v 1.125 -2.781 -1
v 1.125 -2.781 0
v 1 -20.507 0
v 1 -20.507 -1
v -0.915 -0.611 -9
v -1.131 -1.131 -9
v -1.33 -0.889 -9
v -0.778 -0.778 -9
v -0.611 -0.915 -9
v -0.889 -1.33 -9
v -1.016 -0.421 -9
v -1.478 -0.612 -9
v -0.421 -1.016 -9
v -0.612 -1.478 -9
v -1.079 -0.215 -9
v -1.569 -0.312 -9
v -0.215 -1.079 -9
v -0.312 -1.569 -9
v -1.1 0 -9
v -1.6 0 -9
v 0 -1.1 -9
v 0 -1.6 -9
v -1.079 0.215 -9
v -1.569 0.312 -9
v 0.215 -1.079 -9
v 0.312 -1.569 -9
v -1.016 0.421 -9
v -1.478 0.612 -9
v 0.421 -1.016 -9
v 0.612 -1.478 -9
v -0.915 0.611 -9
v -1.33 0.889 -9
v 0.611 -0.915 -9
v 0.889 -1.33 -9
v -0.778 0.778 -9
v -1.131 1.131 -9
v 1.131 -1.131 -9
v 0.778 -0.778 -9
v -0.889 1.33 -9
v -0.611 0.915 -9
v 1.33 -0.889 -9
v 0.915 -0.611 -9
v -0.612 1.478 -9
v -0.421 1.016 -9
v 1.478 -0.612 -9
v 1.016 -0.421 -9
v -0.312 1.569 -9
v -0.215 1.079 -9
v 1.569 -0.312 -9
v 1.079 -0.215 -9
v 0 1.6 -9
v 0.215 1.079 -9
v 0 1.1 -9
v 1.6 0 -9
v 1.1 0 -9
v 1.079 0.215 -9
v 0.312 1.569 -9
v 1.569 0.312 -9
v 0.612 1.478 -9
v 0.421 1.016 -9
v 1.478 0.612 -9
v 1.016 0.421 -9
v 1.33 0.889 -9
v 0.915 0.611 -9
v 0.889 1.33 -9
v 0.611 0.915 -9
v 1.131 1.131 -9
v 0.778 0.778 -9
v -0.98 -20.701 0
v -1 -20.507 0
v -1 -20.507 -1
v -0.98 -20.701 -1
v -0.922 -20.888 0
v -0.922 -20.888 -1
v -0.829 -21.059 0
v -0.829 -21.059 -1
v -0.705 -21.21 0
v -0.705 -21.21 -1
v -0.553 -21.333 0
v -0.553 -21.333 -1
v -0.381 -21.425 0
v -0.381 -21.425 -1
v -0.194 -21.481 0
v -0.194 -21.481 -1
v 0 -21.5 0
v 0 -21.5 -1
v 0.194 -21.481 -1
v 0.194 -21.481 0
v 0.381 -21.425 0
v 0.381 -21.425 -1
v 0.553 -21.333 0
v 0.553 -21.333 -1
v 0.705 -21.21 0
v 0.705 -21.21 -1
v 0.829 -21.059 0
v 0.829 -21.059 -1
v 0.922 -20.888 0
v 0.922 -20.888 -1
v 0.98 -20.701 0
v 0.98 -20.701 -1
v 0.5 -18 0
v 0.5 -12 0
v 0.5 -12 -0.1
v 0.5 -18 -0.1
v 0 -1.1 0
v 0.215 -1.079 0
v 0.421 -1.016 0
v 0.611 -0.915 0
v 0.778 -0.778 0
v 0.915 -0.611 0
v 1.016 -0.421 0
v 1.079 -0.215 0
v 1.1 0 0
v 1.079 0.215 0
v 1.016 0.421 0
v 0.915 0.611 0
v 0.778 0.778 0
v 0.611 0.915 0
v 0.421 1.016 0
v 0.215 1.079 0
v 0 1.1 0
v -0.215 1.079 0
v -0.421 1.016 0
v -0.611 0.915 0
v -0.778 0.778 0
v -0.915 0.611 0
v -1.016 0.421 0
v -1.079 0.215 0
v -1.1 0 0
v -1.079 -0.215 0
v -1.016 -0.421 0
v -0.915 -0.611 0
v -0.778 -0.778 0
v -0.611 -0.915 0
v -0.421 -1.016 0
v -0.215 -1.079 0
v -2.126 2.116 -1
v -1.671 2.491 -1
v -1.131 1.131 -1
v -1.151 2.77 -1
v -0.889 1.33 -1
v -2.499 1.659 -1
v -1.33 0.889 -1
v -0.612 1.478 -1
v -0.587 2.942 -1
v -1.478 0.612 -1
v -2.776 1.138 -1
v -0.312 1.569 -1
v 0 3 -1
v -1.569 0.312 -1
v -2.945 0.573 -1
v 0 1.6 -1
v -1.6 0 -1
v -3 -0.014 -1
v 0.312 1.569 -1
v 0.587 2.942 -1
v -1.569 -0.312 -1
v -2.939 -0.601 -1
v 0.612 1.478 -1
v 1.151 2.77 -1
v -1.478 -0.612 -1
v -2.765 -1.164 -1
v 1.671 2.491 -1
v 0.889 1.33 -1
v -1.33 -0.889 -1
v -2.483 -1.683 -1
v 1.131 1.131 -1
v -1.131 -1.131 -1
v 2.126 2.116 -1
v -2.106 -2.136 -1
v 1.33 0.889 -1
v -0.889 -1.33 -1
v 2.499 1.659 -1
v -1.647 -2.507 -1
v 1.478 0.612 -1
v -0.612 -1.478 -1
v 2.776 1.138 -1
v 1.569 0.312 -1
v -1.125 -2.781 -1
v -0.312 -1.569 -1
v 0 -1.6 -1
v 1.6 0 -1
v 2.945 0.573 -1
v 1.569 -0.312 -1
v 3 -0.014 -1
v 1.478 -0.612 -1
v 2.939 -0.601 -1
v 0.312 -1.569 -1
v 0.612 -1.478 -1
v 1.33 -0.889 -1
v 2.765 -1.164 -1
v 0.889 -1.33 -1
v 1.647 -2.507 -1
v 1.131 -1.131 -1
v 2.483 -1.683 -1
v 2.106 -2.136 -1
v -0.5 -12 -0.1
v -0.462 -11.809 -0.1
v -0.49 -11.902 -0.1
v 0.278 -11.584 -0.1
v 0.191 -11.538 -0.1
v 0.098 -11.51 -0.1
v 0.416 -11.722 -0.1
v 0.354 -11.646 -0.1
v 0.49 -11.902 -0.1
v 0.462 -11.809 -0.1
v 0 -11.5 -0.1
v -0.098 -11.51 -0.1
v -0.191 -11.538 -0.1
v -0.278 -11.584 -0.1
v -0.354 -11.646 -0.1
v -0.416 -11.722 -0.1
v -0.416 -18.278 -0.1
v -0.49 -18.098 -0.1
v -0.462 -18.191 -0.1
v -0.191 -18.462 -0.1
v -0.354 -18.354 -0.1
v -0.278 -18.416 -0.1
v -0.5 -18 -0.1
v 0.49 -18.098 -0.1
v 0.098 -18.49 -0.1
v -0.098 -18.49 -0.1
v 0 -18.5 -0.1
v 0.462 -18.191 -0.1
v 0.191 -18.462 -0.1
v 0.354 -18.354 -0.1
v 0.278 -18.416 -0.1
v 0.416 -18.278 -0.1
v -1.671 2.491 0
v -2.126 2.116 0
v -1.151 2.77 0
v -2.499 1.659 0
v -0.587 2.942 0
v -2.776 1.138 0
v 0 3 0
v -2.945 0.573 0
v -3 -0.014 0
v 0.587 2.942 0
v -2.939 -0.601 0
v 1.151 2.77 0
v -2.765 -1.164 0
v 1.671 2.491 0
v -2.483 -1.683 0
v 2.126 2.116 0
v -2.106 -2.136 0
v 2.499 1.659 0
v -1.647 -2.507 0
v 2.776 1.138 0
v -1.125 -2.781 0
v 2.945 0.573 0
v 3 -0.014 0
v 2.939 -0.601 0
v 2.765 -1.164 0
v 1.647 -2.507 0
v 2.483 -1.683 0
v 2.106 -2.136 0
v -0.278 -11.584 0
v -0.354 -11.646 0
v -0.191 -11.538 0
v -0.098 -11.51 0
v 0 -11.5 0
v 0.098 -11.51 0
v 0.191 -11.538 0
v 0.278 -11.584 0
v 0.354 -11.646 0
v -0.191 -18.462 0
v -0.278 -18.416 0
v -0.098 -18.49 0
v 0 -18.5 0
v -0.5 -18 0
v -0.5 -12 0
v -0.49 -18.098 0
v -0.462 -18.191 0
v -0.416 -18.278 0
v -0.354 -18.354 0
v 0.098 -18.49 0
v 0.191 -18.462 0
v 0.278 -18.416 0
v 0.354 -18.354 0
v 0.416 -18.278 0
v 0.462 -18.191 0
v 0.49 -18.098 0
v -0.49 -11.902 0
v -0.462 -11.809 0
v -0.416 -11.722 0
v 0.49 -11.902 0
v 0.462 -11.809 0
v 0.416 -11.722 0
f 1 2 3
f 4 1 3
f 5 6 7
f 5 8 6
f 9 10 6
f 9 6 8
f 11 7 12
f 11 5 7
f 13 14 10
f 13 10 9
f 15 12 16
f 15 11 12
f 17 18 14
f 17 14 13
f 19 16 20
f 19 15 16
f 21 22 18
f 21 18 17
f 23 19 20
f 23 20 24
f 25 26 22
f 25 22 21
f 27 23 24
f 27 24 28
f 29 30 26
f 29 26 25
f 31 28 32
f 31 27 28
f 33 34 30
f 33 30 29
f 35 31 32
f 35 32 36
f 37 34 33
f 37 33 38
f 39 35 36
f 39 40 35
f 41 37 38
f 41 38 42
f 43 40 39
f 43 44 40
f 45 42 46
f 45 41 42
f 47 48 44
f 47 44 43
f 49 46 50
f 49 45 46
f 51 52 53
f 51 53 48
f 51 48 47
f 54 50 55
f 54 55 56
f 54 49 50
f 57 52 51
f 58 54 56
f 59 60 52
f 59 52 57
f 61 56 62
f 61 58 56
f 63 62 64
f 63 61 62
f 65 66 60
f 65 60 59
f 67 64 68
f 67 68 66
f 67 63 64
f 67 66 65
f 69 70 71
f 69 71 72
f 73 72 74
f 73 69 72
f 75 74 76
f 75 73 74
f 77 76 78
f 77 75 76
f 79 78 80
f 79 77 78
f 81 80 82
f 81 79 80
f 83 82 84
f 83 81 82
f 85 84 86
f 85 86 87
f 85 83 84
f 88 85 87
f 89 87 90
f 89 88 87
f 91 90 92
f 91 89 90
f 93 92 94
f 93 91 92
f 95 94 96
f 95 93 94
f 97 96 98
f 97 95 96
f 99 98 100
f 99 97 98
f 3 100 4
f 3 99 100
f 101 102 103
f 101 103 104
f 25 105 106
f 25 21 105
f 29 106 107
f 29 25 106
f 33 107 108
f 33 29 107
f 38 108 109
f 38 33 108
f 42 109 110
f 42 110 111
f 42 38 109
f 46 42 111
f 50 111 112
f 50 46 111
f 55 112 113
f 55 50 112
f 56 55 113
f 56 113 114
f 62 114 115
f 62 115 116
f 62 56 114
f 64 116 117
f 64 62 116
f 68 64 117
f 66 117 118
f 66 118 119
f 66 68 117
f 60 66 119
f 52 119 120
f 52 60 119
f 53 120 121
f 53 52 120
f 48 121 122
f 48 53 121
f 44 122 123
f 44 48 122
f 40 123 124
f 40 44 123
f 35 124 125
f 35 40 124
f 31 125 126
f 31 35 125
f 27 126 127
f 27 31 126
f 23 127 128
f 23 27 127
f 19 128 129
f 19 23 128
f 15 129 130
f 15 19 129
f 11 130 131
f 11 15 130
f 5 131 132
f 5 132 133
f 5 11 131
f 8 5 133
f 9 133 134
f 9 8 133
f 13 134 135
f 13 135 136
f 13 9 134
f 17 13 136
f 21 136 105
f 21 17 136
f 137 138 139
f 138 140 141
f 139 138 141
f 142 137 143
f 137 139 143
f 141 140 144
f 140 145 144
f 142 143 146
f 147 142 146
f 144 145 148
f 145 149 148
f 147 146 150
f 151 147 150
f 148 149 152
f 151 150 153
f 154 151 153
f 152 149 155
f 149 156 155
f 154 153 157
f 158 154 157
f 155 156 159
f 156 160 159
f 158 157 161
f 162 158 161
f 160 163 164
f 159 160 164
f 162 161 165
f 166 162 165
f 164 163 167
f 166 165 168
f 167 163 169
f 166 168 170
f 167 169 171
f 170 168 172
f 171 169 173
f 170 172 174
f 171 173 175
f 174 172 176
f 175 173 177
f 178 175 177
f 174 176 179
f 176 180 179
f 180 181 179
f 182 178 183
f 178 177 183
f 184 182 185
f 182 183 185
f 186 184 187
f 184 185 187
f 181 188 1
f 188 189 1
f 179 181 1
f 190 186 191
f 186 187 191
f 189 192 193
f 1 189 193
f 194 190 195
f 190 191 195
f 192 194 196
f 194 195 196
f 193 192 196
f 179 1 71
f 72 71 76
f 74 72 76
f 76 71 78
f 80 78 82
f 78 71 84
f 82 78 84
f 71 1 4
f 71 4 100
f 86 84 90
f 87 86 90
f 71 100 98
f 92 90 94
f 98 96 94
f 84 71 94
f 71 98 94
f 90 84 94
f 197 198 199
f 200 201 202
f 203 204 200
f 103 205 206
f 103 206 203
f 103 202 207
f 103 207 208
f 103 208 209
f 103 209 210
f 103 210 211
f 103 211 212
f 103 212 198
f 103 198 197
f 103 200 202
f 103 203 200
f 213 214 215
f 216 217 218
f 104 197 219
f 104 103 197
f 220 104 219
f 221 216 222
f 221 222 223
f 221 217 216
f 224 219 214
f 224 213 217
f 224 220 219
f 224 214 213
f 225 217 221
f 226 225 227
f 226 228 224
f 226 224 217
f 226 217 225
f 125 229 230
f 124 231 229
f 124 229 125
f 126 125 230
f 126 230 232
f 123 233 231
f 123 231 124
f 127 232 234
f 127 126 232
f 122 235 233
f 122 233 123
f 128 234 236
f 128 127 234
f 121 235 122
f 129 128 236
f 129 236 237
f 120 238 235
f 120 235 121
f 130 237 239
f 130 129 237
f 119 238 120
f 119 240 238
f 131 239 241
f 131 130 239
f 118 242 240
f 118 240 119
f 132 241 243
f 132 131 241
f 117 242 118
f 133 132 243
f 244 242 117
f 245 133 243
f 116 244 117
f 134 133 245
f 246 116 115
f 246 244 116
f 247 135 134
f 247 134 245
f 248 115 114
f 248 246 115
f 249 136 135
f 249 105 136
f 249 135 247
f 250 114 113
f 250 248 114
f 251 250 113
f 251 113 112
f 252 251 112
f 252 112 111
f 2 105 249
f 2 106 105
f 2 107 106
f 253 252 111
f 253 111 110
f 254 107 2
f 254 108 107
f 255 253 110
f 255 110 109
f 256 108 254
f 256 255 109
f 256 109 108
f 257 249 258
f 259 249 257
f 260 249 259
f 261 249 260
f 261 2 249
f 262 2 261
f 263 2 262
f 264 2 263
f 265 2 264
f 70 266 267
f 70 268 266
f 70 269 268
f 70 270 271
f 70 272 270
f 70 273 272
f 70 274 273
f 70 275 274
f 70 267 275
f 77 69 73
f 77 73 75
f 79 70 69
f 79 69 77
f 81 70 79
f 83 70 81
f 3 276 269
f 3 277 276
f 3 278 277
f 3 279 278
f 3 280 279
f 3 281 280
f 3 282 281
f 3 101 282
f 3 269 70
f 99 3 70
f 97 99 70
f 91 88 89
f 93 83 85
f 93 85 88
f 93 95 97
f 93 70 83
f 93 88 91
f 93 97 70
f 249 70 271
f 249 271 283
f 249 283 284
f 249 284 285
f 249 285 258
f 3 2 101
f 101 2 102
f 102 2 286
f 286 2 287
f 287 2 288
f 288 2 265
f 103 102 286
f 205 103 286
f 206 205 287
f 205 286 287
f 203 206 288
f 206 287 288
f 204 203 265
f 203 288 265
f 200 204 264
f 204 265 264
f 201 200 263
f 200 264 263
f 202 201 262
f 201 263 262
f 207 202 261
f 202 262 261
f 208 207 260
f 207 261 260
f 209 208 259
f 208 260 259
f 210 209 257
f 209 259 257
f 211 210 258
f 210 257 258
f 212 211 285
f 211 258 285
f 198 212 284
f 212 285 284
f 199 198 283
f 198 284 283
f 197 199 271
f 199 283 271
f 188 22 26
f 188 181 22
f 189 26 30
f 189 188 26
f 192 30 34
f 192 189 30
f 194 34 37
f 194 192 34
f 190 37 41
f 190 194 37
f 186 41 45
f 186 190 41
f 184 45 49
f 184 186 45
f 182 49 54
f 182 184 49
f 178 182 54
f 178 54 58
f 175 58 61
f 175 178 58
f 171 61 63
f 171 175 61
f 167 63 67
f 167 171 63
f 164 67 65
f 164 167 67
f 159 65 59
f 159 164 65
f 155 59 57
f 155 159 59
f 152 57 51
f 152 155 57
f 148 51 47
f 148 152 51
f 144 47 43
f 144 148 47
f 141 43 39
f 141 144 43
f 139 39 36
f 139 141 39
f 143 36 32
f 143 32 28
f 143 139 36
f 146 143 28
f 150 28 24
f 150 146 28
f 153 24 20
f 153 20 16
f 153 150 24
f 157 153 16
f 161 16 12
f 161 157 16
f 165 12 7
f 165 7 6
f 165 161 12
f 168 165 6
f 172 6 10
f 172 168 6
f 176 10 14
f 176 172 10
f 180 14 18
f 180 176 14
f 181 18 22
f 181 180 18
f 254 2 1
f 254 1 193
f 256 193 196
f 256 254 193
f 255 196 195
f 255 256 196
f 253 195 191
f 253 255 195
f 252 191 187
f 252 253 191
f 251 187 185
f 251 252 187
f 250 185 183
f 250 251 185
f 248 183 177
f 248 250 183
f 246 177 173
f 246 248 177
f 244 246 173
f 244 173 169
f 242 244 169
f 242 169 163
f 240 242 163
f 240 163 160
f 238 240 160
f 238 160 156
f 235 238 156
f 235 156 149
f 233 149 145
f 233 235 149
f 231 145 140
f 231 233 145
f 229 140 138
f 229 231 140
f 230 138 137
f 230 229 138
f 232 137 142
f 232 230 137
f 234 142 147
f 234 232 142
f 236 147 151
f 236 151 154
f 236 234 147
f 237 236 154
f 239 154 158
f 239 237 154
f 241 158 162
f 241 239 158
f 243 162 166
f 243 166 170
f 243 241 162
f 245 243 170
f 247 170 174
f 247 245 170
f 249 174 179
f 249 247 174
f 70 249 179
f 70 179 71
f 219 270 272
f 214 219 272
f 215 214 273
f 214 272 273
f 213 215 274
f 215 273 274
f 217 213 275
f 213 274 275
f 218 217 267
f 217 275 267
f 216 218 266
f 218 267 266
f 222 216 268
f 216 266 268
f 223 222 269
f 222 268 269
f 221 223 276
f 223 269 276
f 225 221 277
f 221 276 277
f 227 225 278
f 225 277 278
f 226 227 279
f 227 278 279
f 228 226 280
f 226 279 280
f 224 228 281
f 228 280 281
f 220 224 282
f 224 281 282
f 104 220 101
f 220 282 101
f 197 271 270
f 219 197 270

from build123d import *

# Parameters (mm, degrees)
PAD_DEPTH    = 1
POCKET_DEPTH = 0.1


with BuildPart() as part:
    # Sketch → Revolution (revolve)
    with BuildSketch(Plane.YZ):
        Polygon((-3, 0), (-1.1, 0), (-1.1, -9), (-1.6, -9), (-1.6, -1), (-3, -1), align=None)
    revolve(axis=Axis((0, 0, 0), (0, 0, 1)))

    # Sketch001 (on Face1 of Revolution) → Pad (new body)
    with BuildSketch(Plane(origin=(0, 0, 0), x_dir=(0, -1, 0), z_dir=(0, 0, 1))):
        with BuildLine():
            Line((2.781074, 1.125), (2.781074, -1.125))
            Line((2.781074, -1.125), (20.507022, -1))
            ThreePointArc((20.507022, -1), (21.5, 0), (20.507022, 1))
            Line((2.781074, 1.125), (20.507022, 1))
        make_face()
    extrude(amount=-PAD_DEPTH)

    # Sketch002 (on Face2 of Pad) → Pocket (cut)
    with BuildSketch(Plane(origin=(0, 0, 0), x_dir=(0, -1, 0), z_dir=(0, 0, 1))):
        with BuildLine():
            ThreePointArc((12, 0.5), (11.5, 0), (12, -0.5))
            Line((12, -0.5), (18, -0.5))
            ThreePointArc((18, -0.5), (18.5, 0), (18, 0.5))
            Line((12, 0.5), (18, 0.5))
        make_face()
    extrude(amount=-POCKET_DEPTH, mode=Mode.SUBTRACT)


solid = part.part
